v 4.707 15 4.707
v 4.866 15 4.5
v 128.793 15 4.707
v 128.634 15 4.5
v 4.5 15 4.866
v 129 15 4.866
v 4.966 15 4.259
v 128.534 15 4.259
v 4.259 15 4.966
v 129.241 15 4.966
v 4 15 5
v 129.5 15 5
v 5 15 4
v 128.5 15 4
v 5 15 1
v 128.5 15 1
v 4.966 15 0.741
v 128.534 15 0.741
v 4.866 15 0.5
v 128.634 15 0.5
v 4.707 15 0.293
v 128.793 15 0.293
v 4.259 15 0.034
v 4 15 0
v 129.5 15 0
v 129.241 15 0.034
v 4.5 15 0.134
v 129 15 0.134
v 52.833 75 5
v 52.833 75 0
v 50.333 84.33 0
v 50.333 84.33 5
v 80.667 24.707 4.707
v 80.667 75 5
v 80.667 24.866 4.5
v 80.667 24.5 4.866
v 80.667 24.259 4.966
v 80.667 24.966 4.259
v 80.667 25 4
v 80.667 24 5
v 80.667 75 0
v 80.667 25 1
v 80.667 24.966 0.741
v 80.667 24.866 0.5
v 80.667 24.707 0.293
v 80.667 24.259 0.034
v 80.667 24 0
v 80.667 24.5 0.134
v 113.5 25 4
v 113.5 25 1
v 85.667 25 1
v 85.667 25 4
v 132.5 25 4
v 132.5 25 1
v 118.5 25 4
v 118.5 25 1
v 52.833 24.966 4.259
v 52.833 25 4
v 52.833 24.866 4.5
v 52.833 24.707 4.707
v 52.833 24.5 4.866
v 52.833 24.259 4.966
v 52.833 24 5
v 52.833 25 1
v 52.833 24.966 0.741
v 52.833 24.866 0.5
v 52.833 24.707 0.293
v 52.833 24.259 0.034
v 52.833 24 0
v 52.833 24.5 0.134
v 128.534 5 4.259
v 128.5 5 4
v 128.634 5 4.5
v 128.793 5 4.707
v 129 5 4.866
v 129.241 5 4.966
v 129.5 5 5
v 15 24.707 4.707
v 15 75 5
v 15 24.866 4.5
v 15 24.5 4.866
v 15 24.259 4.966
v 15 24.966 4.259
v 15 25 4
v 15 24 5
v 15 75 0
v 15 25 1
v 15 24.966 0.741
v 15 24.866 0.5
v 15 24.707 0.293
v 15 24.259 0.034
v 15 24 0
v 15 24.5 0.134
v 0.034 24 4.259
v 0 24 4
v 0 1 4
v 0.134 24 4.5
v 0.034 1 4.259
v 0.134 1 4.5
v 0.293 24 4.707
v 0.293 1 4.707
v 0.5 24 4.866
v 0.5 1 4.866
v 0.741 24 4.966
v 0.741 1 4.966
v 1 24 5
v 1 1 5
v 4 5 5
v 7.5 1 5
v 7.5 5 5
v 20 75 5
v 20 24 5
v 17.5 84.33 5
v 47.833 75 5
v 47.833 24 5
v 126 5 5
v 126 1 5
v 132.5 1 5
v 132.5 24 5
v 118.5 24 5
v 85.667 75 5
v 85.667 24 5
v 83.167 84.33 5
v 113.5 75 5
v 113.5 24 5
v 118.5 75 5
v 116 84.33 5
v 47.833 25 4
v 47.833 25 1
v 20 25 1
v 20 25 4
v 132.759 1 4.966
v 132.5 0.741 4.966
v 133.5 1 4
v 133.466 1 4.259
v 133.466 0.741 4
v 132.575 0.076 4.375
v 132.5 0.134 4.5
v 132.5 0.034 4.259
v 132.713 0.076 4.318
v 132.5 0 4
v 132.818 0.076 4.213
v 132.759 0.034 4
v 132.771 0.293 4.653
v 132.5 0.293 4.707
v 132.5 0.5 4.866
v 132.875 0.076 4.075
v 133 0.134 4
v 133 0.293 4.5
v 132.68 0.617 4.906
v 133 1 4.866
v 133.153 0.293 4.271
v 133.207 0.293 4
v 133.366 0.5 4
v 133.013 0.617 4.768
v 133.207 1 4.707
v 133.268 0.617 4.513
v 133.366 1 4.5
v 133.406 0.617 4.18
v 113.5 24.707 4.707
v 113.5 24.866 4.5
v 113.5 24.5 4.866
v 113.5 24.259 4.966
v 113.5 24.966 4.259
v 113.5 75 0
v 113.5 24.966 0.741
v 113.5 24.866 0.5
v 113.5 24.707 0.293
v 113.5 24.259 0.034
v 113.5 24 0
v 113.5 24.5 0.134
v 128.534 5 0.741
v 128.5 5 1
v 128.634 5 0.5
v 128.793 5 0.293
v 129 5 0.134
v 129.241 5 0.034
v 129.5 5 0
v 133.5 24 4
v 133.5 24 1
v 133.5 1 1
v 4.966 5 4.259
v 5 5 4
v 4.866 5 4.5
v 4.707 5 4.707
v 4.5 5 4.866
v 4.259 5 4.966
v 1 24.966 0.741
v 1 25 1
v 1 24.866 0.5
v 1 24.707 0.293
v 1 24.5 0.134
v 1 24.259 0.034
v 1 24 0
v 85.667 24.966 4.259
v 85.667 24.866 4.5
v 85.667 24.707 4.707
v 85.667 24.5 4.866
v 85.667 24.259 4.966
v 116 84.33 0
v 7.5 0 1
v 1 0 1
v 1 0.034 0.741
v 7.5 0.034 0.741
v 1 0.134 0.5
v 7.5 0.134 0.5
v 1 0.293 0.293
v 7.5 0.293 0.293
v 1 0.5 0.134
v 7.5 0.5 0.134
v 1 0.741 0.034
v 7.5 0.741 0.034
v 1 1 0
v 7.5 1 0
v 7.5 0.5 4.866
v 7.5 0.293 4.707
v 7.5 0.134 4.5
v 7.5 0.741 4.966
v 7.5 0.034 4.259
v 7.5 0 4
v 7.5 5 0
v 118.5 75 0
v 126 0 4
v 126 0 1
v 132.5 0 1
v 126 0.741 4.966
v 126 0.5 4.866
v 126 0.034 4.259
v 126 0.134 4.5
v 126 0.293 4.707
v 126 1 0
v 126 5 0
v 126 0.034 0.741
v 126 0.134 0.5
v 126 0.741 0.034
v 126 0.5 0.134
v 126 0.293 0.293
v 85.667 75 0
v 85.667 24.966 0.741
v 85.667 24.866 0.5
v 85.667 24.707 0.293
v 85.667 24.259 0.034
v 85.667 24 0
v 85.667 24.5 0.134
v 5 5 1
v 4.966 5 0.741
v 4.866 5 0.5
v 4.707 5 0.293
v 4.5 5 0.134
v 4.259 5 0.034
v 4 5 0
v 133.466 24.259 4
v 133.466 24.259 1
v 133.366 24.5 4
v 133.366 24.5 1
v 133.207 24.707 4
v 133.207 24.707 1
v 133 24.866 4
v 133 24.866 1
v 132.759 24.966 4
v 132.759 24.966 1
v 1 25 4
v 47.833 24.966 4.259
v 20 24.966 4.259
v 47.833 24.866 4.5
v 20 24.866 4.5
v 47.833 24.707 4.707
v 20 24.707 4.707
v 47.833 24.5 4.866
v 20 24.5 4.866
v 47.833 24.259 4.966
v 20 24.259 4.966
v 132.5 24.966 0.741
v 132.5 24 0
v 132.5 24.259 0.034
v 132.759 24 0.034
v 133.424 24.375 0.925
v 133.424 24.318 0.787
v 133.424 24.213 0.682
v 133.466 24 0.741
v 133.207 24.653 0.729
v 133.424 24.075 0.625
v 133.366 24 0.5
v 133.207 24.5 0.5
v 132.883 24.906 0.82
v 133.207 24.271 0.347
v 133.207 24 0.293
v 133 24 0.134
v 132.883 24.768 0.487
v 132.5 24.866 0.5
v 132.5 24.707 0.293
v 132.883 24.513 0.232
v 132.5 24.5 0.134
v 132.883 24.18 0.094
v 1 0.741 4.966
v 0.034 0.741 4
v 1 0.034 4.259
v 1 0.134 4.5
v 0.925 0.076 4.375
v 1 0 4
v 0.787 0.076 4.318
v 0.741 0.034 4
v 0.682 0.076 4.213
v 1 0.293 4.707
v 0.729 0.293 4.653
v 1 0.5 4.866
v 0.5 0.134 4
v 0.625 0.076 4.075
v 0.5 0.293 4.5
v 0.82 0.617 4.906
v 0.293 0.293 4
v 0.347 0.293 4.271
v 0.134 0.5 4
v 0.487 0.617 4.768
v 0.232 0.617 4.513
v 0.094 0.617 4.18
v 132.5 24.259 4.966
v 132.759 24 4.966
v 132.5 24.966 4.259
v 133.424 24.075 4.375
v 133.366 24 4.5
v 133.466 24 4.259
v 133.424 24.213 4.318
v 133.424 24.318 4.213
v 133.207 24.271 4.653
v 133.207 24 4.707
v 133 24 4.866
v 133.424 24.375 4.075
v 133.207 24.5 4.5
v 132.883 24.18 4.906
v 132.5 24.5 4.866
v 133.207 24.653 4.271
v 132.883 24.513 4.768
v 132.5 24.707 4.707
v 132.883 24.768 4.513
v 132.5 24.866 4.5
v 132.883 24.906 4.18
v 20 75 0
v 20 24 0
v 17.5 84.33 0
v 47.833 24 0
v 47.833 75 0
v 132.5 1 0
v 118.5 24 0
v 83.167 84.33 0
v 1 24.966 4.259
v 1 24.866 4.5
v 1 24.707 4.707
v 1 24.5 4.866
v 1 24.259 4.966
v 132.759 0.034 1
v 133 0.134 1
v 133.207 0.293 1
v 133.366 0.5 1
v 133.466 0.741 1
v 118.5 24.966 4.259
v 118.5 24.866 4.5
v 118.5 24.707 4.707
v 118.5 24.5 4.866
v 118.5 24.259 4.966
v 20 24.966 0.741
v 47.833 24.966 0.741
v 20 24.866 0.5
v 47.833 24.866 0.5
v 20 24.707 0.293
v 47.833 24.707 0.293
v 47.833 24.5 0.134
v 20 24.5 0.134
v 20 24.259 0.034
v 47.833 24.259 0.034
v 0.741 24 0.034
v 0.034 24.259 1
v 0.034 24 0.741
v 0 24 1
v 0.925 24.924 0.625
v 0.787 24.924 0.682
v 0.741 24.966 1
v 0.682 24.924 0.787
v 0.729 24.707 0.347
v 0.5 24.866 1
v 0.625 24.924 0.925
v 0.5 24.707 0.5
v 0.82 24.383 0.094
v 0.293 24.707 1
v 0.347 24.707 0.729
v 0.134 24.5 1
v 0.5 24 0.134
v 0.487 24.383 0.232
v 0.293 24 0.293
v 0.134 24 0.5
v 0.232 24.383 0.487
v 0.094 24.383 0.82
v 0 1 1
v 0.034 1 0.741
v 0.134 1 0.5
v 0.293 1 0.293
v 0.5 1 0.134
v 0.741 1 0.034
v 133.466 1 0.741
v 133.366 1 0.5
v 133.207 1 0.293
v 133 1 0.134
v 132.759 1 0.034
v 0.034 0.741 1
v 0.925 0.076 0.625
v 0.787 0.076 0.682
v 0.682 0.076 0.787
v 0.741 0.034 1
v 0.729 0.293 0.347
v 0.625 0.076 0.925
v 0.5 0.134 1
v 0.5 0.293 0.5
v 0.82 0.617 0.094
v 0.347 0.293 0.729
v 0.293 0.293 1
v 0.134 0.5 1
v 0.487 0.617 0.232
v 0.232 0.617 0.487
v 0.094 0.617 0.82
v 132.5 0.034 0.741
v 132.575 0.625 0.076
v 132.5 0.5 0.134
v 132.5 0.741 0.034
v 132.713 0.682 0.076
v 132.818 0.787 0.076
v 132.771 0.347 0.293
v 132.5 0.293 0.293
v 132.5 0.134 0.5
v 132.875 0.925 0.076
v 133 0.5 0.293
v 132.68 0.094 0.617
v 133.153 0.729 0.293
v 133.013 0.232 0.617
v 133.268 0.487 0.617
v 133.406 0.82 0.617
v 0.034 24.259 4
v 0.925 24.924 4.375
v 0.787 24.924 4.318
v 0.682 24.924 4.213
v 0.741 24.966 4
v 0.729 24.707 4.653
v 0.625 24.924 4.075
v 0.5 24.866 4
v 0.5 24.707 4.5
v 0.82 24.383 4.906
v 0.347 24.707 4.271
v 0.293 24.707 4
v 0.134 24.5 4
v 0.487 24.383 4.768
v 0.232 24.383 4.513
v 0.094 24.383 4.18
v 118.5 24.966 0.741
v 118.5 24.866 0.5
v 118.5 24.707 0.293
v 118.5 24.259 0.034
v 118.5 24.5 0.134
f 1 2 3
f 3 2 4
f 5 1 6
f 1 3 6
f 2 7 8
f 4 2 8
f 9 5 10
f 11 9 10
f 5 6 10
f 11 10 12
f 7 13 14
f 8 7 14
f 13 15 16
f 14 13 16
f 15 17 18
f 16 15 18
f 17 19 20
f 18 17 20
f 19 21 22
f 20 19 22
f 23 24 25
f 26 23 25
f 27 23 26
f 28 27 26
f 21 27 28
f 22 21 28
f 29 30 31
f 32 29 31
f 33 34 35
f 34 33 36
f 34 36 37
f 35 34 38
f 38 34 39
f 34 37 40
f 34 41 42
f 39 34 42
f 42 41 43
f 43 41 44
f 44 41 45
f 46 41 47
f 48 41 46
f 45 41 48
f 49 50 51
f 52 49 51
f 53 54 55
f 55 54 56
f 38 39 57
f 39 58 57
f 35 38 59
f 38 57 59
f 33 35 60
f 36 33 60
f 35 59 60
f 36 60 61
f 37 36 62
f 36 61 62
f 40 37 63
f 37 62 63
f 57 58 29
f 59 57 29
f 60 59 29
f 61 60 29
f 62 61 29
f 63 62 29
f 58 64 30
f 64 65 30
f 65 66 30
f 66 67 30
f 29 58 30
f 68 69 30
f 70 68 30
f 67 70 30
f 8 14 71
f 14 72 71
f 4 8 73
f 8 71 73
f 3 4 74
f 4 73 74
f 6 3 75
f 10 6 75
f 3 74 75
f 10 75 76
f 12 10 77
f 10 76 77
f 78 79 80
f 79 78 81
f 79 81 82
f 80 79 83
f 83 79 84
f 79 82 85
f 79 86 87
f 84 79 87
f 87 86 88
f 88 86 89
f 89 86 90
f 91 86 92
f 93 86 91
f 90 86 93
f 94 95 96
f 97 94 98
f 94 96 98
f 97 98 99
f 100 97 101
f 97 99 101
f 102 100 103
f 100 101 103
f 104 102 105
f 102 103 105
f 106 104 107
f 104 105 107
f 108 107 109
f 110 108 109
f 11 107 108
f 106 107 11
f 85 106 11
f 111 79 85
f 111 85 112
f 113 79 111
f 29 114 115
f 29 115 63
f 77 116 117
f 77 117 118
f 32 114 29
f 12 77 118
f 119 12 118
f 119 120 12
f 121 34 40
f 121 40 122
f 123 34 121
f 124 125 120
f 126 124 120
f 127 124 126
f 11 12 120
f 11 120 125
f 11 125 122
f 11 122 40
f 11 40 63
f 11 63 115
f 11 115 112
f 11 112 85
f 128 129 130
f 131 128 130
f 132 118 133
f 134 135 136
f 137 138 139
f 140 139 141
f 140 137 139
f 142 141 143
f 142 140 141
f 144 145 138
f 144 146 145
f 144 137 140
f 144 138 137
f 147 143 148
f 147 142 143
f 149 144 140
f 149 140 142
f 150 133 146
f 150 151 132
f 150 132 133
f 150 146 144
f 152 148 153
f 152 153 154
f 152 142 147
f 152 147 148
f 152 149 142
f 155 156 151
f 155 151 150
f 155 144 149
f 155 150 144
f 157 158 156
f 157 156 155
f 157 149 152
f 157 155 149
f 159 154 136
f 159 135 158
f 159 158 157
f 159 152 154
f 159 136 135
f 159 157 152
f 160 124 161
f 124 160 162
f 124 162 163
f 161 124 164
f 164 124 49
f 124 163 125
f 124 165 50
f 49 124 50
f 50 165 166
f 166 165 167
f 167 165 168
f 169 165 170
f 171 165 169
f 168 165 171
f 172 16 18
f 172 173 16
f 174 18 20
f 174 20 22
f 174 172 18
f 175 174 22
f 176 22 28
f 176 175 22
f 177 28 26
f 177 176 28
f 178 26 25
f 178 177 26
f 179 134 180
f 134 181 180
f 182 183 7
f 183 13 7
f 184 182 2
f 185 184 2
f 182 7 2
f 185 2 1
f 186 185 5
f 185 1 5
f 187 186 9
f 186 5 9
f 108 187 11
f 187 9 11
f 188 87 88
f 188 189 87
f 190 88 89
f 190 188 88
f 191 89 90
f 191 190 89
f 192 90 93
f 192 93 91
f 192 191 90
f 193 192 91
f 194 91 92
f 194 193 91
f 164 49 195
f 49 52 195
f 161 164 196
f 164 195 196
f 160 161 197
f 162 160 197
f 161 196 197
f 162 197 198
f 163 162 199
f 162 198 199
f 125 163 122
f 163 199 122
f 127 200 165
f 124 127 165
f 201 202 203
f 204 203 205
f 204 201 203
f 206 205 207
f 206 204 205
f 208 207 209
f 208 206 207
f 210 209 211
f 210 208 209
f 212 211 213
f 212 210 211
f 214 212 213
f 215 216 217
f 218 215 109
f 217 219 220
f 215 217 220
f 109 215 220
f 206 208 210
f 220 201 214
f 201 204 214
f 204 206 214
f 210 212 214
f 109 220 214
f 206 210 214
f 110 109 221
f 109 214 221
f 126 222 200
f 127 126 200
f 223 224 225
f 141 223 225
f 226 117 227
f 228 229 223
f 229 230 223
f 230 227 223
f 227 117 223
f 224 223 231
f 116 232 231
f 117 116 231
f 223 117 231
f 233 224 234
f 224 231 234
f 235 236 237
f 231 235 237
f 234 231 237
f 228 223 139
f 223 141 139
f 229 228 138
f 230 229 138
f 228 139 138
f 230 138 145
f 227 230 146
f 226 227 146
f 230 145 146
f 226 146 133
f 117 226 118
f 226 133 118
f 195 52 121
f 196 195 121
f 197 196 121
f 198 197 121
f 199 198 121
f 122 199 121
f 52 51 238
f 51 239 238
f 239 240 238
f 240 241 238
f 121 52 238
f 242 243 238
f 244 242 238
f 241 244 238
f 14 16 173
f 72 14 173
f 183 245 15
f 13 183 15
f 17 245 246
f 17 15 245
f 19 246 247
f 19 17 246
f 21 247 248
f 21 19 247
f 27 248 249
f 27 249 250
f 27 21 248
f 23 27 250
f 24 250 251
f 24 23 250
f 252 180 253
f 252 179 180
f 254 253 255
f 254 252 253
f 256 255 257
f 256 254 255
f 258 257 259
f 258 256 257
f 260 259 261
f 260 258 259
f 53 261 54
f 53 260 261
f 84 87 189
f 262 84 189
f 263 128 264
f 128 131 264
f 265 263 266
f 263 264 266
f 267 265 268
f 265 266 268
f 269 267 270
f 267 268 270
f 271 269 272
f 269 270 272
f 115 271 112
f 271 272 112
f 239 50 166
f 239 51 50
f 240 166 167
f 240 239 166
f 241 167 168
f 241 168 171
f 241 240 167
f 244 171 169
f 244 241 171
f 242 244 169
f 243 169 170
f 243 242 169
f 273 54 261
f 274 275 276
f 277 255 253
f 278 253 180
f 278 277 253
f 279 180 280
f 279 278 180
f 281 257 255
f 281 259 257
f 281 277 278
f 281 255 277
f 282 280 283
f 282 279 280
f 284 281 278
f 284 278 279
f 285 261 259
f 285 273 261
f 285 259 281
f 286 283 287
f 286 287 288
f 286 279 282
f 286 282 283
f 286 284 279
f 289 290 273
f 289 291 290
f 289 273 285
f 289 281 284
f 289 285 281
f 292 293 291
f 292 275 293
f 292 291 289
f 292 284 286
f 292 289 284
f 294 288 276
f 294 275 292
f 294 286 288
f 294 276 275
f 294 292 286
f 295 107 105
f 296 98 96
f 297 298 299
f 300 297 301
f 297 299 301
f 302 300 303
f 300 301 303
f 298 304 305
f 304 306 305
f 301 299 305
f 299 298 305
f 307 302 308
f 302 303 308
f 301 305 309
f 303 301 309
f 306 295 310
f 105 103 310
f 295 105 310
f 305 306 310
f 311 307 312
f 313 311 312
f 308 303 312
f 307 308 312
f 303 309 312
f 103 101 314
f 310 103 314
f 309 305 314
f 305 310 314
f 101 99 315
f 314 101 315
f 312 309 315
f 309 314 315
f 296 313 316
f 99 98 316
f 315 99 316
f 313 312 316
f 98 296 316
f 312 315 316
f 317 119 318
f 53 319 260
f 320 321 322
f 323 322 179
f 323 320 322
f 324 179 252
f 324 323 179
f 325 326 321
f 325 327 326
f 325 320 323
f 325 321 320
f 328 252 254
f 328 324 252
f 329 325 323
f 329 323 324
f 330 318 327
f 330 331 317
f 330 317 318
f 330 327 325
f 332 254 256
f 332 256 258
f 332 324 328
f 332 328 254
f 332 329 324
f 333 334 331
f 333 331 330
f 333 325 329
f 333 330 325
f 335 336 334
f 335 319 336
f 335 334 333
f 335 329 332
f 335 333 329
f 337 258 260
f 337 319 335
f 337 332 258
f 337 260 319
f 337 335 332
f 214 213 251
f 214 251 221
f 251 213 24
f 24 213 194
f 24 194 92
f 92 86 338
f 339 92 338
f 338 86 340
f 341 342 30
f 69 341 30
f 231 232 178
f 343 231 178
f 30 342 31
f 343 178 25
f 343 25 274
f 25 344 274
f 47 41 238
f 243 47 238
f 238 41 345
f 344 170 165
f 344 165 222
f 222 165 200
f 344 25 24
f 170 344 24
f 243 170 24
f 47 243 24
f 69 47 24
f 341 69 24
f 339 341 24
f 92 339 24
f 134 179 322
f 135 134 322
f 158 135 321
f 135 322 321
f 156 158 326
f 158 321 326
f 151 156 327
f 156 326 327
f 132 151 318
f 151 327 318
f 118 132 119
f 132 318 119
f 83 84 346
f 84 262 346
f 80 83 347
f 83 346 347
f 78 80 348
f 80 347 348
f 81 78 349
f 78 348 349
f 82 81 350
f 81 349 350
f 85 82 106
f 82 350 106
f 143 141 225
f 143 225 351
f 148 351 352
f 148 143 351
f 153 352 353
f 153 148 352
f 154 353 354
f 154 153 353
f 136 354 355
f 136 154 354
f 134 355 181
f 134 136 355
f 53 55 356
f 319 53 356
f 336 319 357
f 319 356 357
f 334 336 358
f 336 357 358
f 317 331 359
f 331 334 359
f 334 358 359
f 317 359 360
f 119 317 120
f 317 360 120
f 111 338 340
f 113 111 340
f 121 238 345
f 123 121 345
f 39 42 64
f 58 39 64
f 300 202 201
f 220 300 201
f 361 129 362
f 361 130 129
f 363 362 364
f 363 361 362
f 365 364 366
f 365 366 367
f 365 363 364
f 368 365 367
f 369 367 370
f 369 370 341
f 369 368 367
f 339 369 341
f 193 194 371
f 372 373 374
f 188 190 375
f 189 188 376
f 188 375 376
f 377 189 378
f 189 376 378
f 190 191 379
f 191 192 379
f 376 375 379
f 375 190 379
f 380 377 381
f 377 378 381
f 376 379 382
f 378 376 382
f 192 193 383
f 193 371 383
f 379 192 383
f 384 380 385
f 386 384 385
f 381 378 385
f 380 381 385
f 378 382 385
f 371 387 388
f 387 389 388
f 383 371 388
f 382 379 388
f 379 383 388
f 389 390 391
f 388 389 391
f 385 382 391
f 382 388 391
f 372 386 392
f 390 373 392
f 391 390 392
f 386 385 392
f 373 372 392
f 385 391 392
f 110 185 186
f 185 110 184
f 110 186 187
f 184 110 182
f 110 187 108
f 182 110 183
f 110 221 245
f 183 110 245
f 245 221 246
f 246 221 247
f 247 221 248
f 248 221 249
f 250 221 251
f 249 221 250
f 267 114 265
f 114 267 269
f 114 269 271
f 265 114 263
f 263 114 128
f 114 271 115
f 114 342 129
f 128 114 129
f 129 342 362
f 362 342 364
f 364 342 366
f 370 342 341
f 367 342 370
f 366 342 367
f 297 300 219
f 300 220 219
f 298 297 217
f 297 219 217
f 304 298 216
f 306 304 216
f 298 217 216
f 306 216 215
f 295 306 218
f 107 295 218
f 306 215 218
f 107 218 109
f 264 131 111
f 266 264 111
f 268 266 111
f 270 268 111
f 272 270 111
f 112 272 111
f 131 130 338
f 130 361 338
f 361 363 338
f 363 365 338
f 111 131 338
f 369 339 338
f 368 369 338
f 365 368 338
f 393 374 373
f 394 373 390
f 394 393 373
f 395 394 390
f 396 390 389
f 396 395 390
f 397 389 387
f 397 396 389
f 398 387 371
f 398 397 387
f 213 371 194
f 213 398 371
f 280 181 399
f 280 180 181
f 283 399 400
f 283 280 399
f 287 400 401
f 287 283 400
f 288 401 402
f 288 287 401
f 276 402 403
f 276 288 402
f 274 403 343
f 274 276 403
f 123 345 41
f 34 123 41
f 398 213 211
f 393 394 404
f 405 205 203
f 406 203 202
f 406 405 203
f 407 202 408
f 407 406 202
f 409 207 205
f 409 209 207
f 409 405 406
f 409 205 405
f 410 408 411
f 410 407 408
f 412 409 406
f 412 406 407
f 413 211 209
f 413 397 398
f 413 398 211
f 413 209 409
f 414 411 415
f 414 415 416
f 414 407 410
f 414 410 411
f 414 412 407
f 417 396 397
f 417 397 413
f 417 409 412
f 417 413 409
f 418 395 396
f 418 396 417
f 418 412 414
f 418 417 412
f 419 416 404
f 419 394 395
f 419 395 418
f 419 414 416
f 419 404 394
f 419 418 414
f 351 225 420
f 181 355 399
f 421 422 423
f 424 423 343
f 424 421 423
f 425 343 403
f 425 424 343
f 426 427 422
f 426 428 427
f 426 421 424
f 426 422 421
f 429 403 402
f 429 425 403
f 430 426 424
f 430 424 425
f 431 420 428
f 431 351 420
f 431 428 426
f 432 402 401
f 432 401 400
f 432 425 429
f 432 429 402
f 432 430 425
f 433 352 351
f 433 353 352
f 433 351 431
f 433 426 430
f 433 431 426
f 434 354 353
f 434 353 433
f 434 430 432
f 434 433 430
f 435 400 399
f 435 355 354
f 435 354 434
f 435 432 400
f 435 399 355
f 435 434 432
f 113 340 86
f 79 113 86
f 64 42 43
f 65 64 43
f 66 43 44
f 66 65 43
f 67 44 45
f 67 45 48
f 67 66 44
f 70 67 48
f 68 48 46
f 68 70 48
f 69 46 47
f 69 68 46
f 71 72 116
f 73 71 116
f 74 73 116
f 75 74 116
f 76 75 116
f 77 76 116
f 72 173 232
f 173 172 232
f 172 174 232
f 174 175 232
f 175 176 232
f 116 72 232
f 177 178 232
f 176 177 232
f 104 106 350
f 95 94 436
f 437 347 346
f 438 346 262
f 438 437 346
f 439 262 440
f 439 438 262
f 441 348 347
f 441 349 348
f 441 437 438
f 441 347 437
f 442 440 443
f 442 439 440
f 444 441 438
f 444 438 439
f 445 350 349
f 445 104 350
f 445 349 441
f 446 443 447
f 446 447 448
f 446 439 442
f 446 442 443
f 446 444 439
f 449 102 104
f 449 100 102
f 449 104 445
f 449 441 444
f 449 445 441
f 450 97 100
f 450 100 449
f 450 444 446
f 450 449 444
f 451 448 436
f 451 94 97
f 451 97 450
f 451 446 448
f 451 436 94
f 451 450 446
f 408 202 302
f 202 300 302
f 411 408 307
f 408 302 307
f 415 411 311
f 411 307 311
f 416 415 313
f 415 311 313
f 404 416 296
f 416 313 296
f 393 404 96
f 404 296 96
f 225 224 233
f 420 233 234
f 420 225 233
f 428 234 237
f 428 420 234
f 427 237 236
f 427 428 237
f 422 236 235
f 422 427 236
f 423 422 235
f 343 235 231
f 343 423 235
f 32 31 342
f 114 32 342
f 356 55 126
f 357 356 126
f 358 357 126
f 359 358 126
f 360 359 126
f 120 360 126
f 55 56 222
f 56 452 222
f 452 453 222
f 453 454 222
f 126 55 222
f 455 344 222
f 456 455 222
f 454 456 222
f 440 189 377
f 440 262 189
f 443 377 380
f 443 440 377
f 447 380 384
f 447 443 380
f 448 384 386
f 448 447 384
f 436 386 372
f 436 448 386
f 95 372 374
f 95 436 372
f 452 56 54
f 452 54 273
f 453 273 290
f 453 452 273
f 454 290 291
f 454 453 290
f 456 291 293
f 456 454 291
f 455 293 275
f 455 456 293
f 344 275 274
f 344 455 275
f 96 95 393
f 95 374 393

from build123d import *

# Parameters (mm, degrees)
PAD_DEPTH = 5
FILLET_R  = 1


with BuildPart() as part:
    # Sketch → Pad (new body)
    with BuildSketch(Plane.XY):
        Polygon((0, 0), (7.5, 0), (7.5, 5), (5, 5), (5, 15), (128.5, 15), (128.5, 5), (126, 5), (126, 0), (133.5, 0), (133.5, 25), (118.5, 25), (118.5, 75), (116, 84.330127), (113.5, 75), (113.5, 25), (85.666667, 25), (85.666667, 75), (83.166667, 84.330127), (80.666667, 75), (80.666667, 25), (52.833333, 25), (52.833333, 75), (50.333333, 84.330127), (47.833333, 75), (47.833333, 25), (20, 25), (20, 75), (17.5, 84.330127), (15, 75), (15, 25), (0, 25), align=None)
    extrude(amount=PAD_DEPTH)

    # Fillet
    fillet_edges = [part.edges().sort_by_distance(p)[0] for p in [
        (0, 12.5, 5),
        (0, 12.5, 0),
        (3.75, 0, 5),
        (3.75, 0, 0),
        (7.5, 25, 5),
        (33.916667, 25, 5),
        (66.75, 25, 5),
        (99.583333, 25, 5),
        (126, 25, 5),
        (133.5, 12.5, 5),
        (129.75, 0, 5),
        (133.5, 0, 2.5),
        (129.75, 0, 0),
        (0, 0, 2.5),
        (7.5, 25, 0),
        (33.916667, 25, 0),
        (66.75, 25, 0),
        (99.583333, 25, 0),
        (126, 25, 0),
        (133.5, 25, 2.5),
        (133.5, 12.5, 0),
        (0, 25, 2.5),
        (128.5, 10, 0),
        (128.5, 10, 5),
        (5, 10, 0),
        (5, 10, 5),
    ]]
    fillet(fillet_edges, radius=FILLET_R)


solid = part.part
